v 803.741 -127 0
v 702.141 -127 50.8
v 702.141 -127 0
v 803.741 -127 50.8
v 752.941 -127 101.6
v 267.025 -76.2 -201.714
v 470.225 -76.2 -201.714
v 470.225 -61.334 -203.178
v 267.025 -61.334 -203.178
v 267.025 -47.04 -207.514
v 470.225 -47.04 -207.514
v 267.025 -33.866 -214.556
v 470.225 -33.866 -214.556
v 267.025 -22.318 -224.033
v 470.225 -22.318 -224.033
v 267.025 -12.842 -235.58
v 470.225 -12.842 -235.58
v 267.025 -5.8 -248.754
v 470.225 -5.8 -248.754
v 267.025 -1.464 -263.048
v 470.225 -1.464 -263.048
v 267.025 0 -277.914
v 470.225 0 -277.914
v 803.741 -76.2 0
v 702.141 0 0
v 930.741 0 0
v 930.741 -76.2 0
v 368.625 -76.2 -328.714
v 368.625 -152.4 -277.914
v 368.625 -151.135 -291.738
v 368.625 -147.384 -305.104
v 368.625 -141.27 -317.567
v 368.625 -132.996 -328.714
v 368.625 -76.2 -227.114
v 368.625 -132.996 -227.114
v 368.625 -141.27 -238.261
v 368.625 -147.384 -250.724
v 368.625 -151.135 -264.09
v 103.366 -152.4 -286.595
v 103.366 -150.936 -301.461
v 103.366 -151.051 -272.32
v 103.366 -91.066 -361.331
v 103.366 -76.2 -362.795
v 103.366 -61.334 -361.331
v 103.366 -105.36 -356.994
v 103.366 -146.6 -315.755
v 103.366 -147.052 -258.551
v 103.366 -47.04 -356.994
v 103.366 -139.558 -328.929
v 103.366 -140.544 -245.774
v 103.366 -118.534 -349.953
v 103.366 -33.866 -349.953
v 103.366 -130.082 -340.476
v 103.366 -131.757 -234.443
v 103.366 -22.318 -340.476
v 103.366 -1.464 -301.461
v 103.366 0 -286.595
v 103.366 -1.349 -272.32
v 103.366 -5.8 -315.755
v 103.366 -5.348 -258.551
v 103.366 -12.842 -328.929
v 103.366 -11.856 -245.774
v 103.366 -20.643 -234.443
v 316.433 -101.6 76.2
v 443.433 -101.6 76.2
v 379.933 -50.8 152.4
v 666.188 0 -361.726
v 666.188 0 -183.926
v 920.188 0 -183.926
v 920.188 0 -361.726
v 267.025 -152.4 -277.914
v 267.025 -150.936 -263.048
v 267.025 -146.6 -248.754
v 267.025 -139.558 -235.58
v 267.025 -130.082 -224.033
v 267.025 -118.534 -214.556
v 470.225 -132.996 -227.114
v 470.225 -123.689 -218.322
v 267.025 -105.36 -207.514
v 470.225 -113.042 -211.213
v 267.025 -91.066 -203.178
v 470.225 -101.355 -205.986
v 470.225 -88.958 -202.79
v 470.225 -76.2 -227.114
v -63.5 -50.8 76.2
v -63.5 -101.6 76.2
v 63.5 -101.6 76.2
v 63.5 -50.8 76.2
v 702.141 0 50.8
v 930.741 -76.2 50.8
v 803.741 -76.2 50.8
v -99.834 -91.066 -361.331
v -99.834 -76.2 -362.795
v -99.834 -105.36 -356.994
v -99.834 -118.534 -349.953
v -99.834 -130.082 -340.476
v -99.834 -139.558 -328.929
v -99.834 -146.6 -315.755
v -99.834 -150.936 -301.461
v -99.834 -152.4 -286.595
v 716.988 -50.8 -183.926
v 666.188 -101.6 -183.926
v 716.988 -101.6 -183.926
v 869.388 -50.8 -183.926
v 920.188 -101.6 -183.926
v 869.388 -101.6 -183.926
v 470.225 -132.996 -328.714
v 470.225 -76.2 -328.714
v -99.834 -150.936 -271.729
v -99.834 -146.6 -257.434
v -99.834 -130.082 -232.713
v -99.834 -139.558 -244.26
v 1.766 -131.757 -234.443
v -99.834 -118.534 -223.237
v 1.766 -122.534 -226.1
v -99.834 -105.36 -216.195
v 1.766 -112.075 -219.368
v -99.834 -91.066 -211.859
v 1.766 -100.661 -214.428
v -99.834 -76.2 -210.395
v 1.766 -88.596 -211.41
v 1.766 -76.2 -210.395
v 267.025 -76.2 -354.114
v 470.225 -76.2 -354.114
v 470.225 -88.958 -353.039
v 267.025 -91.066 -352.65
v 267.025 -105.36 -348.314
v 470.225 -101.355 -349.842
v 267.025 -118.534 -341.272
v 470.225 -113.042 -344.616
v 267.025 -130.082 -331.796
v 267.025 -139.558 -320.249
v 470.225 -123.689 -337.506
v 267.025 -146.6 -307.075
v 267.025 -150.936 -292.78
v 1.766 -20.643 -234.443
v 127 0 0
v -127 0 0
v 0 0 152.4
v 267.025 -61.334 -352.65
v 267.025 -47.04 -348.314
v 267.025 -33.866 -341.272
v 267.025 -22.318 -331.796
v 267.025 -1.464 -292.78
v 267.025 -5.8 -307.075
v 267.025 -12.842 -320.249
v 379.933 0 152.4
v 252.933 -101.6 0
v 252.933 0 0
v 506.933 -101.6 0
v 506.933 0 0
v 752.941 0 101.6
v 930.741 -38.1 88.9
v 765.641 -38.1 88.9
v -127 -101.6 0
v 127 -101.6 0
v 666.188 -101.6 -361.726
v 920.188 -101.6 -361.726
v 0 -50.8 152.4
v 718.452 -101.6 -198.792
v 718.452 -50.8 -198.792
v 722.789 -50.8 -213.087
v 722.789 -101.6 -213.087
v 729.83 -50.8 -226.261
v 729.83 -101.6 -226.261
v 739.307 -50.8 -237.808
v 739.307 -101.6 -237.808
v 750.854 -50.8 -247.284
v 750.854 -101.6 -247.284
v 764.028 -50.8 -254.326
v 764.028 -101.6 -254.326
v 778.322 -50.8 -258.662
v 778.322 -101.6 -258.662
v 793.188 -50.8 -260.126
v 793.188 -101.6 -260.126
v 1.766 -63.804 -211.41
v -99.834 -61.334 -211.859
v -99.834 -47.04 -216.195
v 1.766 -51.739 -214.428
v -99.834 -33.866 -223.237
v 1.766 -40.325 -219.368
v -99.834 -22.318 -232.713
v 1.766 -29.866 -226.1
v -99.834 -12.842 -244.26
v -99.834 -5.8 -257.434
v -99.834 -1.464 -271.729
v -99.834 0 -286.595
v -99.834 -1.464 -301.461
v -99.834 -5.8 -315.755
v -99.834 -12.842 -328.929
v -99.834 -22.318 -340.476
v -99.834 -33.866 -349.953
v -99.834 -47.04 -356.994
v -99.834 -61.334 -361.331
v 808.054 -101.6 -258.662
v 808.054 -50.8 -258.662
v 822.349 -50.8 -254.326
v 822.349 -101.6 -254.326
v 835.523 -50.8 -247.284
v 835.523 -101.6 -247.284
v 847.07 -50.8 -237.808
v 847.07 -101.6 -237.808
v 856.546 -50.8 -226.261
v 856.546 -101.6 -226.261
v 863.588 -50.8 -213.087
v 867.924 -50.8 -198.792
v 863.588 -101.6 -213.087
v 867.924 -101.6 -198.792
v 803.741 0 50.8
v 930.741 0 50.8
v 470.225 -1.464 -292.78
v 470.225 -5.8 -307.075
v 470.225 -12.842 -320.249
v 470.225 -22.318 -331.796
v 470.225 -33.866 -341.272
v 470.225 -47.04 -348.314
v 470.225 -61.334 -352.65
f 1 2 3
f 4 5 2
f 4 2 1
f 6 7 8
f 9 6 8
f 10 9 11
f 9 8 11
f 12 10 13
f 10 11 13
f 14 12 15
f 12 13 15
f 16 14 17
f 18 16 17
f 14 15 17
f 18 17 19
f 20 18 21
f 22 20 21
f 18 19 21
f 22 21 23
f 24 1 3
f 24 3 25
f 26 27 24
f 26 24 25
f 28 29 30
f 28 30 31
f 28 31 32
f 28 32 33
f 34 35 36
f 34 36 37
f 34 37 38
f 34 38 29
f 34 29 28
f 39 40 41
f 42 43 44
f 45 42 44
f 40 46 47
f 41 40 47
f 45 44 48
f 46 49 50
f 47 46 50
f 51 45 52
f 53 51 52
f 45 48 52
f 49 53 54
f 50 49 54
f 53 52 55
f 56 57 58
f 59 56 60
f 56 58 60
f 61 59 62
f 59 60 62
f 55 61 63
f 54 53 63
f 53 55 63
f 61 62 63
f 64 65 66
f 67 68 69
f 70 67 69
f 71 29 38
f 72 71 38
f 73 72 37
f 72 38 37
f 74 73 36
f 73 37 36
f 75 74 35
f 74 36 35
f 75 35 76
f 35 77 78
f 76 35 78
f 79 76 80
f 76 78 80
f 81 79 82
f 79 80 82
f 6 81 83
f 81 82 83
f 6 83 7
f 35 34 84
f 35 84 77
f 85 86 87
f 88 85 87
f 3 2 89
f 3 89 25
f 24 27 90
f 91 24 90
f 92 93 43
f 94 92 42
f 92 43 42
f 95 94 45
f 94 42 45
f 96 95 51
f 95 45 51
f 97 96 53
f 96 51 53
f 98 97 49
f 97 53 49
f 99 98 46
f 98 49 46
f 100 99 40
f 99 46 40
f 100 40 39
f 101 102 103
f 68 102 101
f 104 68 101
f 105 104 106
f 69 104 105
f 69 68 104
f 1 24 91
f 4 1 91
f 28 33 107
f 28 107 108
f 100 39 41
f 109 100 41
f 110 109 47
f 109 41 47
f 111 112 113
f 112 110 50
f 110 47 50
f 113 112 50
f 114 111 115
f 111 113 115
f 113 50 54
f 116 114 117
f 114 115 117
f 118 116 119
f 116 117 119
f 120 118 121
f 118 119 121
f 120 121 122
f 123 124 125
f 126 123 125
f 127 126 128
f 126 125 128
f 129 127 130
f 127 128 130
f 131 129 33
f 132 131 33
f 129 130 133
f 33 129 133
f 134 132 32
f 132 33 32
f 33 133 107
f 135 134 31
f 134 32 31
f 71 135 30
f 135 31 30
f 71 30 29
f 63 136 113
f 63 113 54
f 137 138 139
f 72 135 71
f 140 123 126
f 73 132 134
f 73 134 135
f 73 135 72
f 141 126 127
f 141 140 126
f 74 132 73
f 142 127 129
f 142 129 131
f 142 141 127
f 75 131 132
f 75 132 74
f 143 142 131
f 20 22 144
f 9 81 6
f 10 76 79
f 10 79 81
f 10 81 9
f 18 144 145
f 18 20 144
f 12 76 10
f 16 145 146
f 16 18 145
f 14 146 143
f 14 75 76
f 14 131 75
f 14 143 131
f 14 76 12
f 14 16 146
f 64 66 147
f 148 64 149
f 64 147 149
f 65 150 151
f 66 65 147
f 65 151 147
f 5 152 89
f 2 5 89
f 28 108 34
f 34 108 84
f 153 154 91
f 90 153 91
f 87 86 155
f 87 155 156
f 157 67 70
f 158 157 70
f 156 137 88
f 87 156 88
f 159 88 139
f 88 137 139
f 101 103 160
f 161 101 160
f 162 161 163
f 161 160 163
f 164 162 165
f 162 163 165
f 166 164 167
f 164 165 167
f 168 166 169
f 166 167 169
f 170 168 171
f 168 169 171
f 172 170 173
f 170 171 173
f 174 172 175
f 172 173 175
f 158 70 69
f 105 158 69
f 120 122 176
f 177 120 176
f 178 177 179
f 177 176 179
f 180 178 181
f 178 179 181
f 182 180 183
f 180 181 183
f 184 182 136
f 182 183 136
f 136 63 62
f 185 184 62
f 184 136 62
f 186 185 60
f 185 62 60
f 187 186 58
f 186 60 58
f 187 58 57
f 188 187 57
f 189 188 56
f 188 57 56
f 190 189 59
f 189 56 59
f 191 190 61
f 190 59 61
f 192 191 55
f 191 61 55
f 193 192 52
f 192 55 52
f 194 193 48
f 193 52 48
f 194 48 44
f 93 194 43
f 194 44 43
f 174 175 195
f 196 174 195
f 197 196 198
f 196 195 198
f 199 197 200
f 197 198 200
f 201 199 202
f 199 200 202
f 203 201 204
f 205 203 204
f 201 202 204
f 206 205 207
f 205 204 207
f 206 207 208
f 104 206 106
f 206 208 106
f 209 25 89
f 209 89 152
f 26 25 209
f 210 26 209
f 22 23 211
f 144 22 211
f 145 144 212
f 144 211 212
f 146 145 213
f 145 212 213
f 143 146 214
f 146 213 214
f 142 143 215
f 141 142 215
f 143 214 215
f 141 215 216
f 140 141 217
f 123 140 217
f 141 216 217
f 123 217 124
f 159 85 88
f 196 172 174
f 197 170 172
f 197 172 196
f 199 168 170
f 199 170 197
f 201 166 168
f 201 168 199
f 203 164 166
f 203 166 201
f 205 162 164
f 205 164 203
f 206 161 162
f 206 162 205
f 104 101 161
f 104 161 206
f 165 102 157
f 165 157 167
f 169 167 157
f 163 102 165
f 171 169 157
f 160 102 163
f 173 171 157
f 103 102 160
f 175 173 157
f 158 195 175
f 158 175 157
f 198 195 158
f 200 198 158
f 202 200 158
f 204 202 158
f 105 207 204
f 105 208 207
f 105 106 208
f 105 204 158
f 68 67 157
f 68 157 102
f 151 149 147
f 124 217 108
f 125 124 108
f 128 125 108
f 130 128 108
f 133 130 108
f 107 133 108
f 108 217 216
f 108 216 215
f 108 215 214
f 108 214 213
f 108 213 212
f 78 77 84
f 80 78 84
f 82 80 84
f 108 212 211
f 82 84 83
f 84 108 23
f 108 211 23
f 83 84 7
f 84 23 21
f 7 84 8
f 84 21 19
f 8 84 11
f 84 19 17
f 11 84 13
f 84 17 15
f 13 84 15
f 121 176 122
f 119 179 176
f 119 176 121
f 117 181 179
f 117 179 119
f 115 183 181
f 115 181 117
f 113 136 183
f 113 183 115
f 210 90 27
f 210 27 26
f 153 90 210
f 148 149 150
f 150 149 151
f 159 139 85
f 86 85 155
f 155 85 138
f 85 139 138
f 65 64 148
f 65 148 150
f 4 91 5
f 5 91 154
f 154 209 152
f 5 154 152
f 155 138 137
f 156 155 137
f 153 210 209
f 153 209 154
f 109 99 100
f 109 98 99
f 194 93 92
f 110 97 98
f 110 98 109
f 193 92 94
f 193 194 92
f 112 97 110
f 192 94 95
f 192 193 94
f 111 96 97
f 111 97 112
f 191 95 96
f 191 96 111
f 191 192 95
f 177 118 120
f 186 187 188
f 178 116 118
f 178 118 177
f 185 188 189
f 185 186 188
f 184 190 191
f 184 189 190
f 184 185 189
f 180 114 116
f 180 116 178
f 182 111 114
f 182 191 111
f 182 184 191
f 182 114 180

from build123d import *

# Parameters (mm, degrees)
F1_DEPTH  = 101.6
F3_DEPTH  = 50.8
F5_DEPTH  = 101.6
F9_DEPTH  = 76.2
F11_DEPTH = 127
F13_W     = 38.1
F13_H     = 50.8
F14_DEPTH = 177.8
F15_W     = 203.2
F15_H     = 152.4
F16_DEPTH = 152.4
F19_DEPTH = 360.68
F18_W     = 101.6
F18_H     = 24.0481388064
F20_DEPTH = 185.42
F21_W     = 203.2
F21_H     = 152.4
F22_DEPTH = 152.4
F25_DEPTH = 203.2
F26_DEPTH = 101.6
F27_W     = 254
F27_H     = 177.8
F28_DEPTH = 101.6
F30_DEPTH = 50.8


with BuildPart() as f1:
    # F0 (on Front) → F1 (new body)
    with BuildSketch(Plane.XZ):
        Polygon((-127, 0), (0, 0), (127, 0), (63.5, 76.2), (0, 76.2), (-63.5, 76.2), align=None)
        Polygon((0, 76.2), (63.5, 76.2), (0, 152.4), (-63.5, 76.2), align=None)
    extrude(amount=F1_DEPTH)

    # F2 (on face) → F3 (cut)
    with BuildSketch(Plane.XZ.offset(101.6)):
        Polygon((-63.5, 76.2), (0, 76.2), (63.5, 76.2), (0, 152.4), align=None)
    extrude(amount=-F3_DEPTH, mode=Mode.SUBTRACT)


with BuildPart() as f5:
    # F4 (on Front) → F5 (new body)
    with BuildSketch(Plane.XZ):
        Polygon((316.4328755193, 76.2), (252.9328755193, 0), (506.9328755193, 0), (443.4328755193, 76.2), align=None)
        Polygon((379.9328755193, 152.4), (316.4328755193, 76.2), (443.4328755193, 76.2), align=None)
    extrude(amount=F5_DEPTH)

    # F8 (on 3pt) → F9 (cut, symmetric)
    with BuildSketch(Plane.YZ.offset(379.9328755193)):
        Polygon((-50.8, 152.4), (-101.6, 152.4), (-101.6, 76.2), align=None)
    extrude(amount=F9_DEPTH, both=True, mode=Mode.SUBTRACT)


with BuildPart() as f11:
    # F10 (on Front) → F11 (new body)
    with BuildSketch(Plane.XZ):
        Polygon((752.9406986994, 101.6), (752.9406986994, 0), (803.7406986994, 0), (803.7406986994, 50.8), align=None)
        Polygon((702.1406986994, 50.8), (702.1406986994, 0), (752.9406986994, 0), (752.9406986994, 101.6), align=None)
    extrude(amount=F11_DEPTH)

    # F13 (on offset) → F14 (join)
    with BuildSketch(Plane.YZ.offset(930.7406986994)):
        Polygon((-76.2, 50.8), (-38.1, 50.8), (-38.1, 88.9), align=None)
        Polygon((-38.1, 50.8), (0, 50.8), (-38.1, 88.9), align=None)
        with Locations((-19.05, 25.4)):
            Rectangle(F13_W, F13_H)
        with Locations((-57.15, 25.4)):
            Rectangle(F13_W, F13_H)
    extrude(amount=-F14_DEPTH)


with BuildPart() as f16:
    # F15 (on Front) → F16 (new body)
    with BuildSketch(Plane.XZ):
        with Locations((1.7657876015, -286.5948253898)):
            Rectangle(F15_W, F15_H)
    extrude(amount=F16_DEPTH)

    # F17 (on face) → F19 (cut)
    with BuildSketch(Plane.YZ.offset(103.3657876015)):
        with BuildLine():
            ThreePointArc((-152.4, -286.5948253898), (-130.0815367264, -232.7132886634), (-76.2, -210.3948253898))
            Line((-76.2, -210.3948253898), (-152.4, -210.3948253898))
            Line((-152.4, -210.3948253898), (-152.4, -286.5948253898))
        make_face()
        with BuildLine():
            Line((0, -210.3948253898), (-76.2, -210.3948253898))
            ThreePointArc((-76.2, -210.3948253898), (-22.3184632736, -232.7132886634), (0, -286.5948253898))
            Line((0, -286.5948253898), (0, -210.3948253898))
        make_face()
        with BuildLine():
            Line((0, -362.7948253898), (0, -286.5948253898))
            ThreePointArc((0, -286.5948253898), (-22.3184632736, -340.4763621162), (-76.2, -362.7948253898))
            Line((-76.2, -362.7948253898), (0, -362.7948253898))
        make_face()
        with BuildLine():
            ThreePointArc((-76.2, -362.7948253898), (-130.0815367264, -340.4763621162), (-152.4, -286.5948253898))
            Line((-152.4, -286.5948253898), (-152.4, -362.7948253898))
            Line((-152.4, -362.7948253898), (-76.2, -362.7948253898))
        make_face()
    extrude(amount=-F19_DEPTH, mode=Mode.SUBTRACT)

    # F18 (on face) → F20 (cut)
    with BuildSketch(Plane.XZ.offset(152.4)):
        with Locations((52.5657876015, -222.418894793)):
            Rectangle(F18_W, F18_H)
    extrude(amount=-F20_DEPTH, mode=Mode.SUBTRACT)


with BuildPart() as f22:
    # F21 (on Front) → F22 (new body)
    with BuildSketch(Plane.XZ):
        with Locations((368.6252981424, -277.9140620219)):
            Rectangle(F21_W, F21_H)
    extrude(amount=F22_DEPTH)

    # F23 (on face) → F25 (cut)
    with BuildSketch(Plane.YZ.offset(470.2252981424)):
        with BuildLine():
            Line((-152.4, -201.7140620219), (-152.4, -277.9140620219))
            ThreePointArc((-152.4, -277.9140620219), (-130.0815367264, -224.0325252955), (-76.2, -201.7140620219))
            Line((-76.2, -201.7140620219), (-152.4, -201.7140620219))
        make_face()
        with BuildLine():
            ThreePointArc((-76.2, -201.7140620219), (-22.3184632736, -224.0325252955), (0, -277.9140620219))
            Line((0, -277.9140620219), (0, -201.7140620219))
            Line((0, -201.7140620219), (-76.2, -201.7140620219))
        make_face()
        with BuildLine():
            ThreePointArc((0, -277.9140620219), (-22.3184632736, -331.7955987483), (-76.2, -354.1140620219))
            Line((-76.2, -354.1140620219), (0, -354.1140620219))
            Line((0, -354.1140620219), (0, -277.9140620219))
        make_face()
        with BuildLine():
            Line((-152.4, -354.1140620219), (-76.2, -354.1140620219))
            ThreePointArc((-76.2, -354.1140620219), (-130.0815367264, -331.7955987483), (-152.4, -277.9140620219))
            Line((-152.4, -277.9140620219), (-152.4, -354.1140620219))
        make_face()
    extrude(amount=-F25_DEPTH, mode=Mode.SUBTRACT)

    # F24 (on face) → F26 (cut)
    with BuildSketch(Plane.YZ.offset(470.2252981424)):
        with BuildLine():
            Line((-76.2, -227.1140620219), (-132.9961266285, -227.1140620219))
            ThreePointArc((-132.9961266285, -227.1140620219), (-147.383933753, -250.7242187812), (-152.4, -277.9140620219))
            Line((-152.4, -277.9140620219), (-76.2, -277.9140620219))
            Line((-76.2, -277.9140620219), (-76.2, -227.1140620219))
        make_face()
        with BuildLine():
            Line((-76.2, -277.9140620219), (-152.4, -277.9140620219))
            ThreePointArc((-152.4, -277.9140620219), (-147.383933753, -305.1039052626), (-132.9961266285, -328.7140620219))
            Line((-132.9961266285, -328.7140620219), (-76.2, -328.7140620219))
            Line((-76.2, -328.7140620219), (-76.2, -277.9140620219))
        make_face()
    extrude(amount=-F26_DEPTH, mode=Mode.SUBTRACT)


with BuildPart() as f28:
    # F27 (on Front) → F28 (new body)
    with BuildSketch(Plane.XZ):
        with Locations((793.1881248951, -272.8261766908)):
            Rectangle(F27_W, F27_H)
    extrude(amount=F28_DEPTH)

    # F29 (on face) → F30 (cut)
    with BuildSketch(Plane.XZ.offset(101.6)):
        with BuildLine():
            Line((793.1881248951, -260.1261766908), (793.1881248951, -183.9261766908))
            Line((793.1881248951, -183.9261766908), (716.9881248951, -183.9261766908))
            ThreePointArc((716.9881248951, -183.9261766908), (739.3065881687, -237.8077134172), (793.1881248951, -260.1261766908))
        make_face()
        with BuildLine():
            Line((869.3881248951, -183.9261766908), (793.1881248951, -183.9261766908))
            Line((793.1881248951, -183.9261766908), (793.1881248951, -260.1261766908))
            ThreePointArc((793.1881248951, -260.1261766908), (847.0696616215, -237.8077134172), (869.3881248951, -183.9261766908))
        make_face()
    extrude(amount=-F30_DEPTH, mode=Mode.SUBTRACT)


solid = Compound([f1.part, f5.part, f11.part, f16.part, f22.part, f28.part])
